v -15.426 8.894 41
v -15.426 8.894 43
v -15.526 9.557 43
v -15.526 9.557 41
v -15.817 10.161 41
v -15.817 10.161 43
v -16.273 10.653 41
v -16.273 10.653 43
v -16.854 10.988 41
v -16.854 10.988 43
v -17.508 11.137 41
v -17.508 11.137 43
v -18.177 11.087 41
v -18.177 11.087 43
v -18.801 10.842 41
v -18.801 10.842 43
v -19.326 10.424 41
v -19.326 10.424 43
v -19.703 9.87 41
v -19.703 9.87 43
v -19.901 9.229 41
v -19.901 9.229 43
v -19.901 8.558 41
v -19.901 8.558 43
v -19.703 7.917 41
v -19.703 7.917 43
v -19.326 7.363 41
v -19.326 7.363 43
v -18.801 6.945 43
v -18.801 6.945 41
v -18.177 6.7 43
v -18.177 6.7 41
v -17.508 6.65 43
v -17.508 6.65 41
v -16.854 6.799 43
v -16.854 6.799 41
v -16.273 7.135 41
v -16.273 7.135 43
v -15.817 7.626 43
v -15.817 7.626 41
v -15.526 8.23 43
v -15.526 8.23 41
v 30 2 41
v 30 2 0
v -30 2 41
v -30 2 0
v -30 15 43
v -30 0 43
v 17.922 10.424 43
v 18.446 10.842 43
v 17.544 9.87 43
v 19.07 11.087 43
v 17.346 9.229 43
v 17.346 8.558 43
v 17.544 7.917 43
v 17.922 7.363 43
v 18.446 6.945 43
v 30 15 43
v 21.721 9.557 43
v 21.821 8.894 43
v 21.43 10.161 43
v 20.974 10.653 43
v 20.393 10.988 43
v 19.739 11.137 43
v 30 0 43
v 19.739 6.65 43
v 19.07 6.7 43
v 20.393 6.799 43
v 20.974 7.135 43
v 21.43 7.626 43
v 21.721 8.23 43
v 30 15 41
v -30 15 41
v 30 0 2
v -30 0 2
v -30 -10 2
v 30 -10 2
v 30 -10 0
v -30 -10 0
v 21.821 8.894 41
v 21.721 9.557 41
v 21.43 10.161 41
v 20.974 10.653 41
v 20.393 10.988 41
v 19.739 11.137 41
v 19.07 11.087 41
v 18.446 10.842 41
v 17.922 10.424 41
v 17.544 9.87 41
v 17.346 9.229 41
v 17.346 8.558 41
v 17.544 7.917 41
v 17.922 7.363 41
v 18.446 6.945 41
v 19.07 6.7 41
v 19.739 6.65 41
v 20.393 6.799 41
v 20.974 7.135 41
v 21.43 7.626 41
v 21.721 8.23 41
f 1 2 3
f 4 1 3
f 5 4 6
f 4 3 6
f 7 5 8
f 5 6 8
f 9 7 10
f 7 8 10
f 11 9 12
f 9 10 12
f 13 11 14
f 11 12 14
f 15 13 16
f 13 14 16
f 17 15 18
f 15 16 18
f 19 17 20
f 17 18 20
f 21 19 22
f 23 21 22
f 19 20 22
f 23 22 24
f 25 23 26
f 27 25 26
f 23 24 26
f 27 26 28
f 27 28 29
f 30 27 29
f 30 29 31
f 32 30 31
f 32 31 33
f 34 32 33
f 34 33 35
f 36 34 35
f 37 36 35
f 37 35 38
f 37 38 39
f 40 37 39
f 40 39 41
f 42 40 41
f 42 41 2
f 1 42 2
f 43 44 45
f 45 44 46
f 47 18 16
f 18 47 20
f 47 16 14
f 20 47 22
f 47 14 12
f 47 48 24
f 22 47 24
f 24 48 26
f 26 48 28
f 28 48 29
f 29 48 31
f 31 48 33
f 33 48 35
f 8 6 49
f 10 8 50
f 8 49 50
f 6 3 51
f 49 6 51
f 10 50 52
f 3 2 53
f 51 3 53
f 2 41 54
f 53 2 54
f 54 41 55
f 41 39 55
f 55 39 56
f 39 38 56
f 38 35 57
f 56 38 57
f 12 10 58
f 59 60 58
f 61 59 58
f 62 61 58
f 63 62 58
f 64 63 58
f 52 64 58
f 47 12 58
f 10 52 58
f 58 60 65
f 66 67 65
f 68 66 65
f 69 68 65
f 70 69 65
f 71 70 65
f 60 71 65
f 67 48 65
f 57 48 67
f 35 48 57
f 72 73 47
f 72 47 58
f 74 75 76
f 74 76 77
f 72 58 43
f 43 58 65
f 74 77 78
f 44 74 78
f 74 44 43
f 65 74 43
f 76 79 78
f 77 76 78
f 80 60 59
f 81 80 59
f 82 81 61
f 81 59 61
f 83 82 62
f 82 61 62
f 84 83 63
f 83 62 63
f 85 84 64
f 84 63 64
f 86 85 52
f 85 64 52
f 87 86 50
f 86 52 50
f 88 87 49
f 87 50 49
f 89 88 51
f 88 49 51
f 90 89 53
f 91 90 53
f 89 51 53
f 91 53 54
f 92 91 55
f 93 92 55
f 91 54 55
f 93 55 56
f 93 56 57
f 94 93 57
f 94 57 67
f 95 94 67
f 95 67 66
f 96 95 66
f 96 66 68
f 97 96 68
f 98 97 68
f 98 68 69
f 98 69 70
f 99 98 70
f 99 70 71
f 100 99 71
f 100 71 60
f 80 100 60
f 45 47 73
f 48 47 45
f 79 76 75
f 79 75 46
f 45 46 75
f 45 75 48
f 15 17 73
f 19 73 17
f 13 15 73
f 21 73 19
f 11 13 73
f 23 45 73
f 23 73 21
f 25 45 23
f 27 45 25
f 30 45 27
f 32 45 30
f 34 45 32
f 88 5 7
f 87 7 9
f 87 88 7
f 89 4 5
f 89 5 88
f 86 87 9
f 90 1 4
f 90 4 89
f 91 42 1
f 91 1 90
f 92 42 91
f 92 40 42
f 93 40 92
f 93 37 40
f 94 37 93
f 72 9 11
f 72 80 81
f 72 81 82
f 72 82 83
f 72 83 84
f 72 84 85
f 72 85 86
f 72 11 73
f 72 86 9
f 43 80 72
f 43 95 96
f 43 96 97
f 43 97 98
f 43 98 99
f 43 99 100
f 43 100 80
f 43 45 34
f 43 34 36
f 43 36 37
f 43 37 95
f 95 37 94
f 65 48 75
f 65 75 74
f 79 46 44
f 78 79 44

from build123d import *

# Parameters (mm, degrees)
SKETCH1_W            = 60
SKETCH1_H            = 20
BOSS_EXTRUDE1_DEPTH  = 43
SKETCH2_W            = 60
SKETCH2_H            = 8
CUT_EXTRUDE1_DEPTH   = 41
SKETCH3_W            = 60
SKETCH3_H            = 10
CUT_EXTRUDE2_DEPTH   = 41
SKETCH4_W            = 60
SKETCH4_H            = 2
BOSS_EXTRUDE2_DEPTH  = 5
M4_CLEARANCE_HOLE1_D = 4.5


with BuildPart() as part:
    # Sketch1 → Boss-Extrude1 (new body)
    with BuildSketch(Plane.XY):
        Rectangle(SKETCH1_W, SKETCH1_H)
    extrude(amount=BOSS_EXTRUDE1_DEPTH)

    # Sketch2 → Cut-Extrude1 (cut)
    with BuildSketch(Plane(origin=(0, 0, 0), x_dir=(-1, 0, 0), z_dir=(0, 0, -1))):
        with Locations((0, 6)):
            Rectangle(SKETCH2_W, SKETCH2_H)
    extrude(amount=-CUT_EXTRUDE1_DEPTH, mode=Mode.SUBTRACT)

    # Sketch3 → Cut-Extrude2 (cut)
    with BuildSketch(Plane.XY.offset(43)):
        with Locations((0, -5)):
            Rectangle(SKETCH3_W, SKETCH3_H)
    extrude(amount=-CUT_EXTRUDE2_DEPTH, mode=Mode.SUBTRACT)

    # Sketch4 → Boss-Extrude2 (add)
    with BuildSketch(Plane(origin=(0, 10, 0), x_dir=(1, 0, 0), z_dir=(0, 1, 0))):
        with Locations((0, -42)):
            Rectangle(SKETCH4_W, SKETCH4_H)
    extrude(amount=BOSS_EXTRUDE2_DEPTH)

    # M4 Clearance Hole1 (through all)
    with Locations(Plane(origin=(0, 0, 41), x_dir=(-1, 0, 0), z_dir=(0, 0, -1))):
        with Locations((-19.571160429, 8.893689212), (17.676175713, 8.893689212)):
            Hole(M4_CLEARANCE_HOLE1_D / 2)


solid = part.part
